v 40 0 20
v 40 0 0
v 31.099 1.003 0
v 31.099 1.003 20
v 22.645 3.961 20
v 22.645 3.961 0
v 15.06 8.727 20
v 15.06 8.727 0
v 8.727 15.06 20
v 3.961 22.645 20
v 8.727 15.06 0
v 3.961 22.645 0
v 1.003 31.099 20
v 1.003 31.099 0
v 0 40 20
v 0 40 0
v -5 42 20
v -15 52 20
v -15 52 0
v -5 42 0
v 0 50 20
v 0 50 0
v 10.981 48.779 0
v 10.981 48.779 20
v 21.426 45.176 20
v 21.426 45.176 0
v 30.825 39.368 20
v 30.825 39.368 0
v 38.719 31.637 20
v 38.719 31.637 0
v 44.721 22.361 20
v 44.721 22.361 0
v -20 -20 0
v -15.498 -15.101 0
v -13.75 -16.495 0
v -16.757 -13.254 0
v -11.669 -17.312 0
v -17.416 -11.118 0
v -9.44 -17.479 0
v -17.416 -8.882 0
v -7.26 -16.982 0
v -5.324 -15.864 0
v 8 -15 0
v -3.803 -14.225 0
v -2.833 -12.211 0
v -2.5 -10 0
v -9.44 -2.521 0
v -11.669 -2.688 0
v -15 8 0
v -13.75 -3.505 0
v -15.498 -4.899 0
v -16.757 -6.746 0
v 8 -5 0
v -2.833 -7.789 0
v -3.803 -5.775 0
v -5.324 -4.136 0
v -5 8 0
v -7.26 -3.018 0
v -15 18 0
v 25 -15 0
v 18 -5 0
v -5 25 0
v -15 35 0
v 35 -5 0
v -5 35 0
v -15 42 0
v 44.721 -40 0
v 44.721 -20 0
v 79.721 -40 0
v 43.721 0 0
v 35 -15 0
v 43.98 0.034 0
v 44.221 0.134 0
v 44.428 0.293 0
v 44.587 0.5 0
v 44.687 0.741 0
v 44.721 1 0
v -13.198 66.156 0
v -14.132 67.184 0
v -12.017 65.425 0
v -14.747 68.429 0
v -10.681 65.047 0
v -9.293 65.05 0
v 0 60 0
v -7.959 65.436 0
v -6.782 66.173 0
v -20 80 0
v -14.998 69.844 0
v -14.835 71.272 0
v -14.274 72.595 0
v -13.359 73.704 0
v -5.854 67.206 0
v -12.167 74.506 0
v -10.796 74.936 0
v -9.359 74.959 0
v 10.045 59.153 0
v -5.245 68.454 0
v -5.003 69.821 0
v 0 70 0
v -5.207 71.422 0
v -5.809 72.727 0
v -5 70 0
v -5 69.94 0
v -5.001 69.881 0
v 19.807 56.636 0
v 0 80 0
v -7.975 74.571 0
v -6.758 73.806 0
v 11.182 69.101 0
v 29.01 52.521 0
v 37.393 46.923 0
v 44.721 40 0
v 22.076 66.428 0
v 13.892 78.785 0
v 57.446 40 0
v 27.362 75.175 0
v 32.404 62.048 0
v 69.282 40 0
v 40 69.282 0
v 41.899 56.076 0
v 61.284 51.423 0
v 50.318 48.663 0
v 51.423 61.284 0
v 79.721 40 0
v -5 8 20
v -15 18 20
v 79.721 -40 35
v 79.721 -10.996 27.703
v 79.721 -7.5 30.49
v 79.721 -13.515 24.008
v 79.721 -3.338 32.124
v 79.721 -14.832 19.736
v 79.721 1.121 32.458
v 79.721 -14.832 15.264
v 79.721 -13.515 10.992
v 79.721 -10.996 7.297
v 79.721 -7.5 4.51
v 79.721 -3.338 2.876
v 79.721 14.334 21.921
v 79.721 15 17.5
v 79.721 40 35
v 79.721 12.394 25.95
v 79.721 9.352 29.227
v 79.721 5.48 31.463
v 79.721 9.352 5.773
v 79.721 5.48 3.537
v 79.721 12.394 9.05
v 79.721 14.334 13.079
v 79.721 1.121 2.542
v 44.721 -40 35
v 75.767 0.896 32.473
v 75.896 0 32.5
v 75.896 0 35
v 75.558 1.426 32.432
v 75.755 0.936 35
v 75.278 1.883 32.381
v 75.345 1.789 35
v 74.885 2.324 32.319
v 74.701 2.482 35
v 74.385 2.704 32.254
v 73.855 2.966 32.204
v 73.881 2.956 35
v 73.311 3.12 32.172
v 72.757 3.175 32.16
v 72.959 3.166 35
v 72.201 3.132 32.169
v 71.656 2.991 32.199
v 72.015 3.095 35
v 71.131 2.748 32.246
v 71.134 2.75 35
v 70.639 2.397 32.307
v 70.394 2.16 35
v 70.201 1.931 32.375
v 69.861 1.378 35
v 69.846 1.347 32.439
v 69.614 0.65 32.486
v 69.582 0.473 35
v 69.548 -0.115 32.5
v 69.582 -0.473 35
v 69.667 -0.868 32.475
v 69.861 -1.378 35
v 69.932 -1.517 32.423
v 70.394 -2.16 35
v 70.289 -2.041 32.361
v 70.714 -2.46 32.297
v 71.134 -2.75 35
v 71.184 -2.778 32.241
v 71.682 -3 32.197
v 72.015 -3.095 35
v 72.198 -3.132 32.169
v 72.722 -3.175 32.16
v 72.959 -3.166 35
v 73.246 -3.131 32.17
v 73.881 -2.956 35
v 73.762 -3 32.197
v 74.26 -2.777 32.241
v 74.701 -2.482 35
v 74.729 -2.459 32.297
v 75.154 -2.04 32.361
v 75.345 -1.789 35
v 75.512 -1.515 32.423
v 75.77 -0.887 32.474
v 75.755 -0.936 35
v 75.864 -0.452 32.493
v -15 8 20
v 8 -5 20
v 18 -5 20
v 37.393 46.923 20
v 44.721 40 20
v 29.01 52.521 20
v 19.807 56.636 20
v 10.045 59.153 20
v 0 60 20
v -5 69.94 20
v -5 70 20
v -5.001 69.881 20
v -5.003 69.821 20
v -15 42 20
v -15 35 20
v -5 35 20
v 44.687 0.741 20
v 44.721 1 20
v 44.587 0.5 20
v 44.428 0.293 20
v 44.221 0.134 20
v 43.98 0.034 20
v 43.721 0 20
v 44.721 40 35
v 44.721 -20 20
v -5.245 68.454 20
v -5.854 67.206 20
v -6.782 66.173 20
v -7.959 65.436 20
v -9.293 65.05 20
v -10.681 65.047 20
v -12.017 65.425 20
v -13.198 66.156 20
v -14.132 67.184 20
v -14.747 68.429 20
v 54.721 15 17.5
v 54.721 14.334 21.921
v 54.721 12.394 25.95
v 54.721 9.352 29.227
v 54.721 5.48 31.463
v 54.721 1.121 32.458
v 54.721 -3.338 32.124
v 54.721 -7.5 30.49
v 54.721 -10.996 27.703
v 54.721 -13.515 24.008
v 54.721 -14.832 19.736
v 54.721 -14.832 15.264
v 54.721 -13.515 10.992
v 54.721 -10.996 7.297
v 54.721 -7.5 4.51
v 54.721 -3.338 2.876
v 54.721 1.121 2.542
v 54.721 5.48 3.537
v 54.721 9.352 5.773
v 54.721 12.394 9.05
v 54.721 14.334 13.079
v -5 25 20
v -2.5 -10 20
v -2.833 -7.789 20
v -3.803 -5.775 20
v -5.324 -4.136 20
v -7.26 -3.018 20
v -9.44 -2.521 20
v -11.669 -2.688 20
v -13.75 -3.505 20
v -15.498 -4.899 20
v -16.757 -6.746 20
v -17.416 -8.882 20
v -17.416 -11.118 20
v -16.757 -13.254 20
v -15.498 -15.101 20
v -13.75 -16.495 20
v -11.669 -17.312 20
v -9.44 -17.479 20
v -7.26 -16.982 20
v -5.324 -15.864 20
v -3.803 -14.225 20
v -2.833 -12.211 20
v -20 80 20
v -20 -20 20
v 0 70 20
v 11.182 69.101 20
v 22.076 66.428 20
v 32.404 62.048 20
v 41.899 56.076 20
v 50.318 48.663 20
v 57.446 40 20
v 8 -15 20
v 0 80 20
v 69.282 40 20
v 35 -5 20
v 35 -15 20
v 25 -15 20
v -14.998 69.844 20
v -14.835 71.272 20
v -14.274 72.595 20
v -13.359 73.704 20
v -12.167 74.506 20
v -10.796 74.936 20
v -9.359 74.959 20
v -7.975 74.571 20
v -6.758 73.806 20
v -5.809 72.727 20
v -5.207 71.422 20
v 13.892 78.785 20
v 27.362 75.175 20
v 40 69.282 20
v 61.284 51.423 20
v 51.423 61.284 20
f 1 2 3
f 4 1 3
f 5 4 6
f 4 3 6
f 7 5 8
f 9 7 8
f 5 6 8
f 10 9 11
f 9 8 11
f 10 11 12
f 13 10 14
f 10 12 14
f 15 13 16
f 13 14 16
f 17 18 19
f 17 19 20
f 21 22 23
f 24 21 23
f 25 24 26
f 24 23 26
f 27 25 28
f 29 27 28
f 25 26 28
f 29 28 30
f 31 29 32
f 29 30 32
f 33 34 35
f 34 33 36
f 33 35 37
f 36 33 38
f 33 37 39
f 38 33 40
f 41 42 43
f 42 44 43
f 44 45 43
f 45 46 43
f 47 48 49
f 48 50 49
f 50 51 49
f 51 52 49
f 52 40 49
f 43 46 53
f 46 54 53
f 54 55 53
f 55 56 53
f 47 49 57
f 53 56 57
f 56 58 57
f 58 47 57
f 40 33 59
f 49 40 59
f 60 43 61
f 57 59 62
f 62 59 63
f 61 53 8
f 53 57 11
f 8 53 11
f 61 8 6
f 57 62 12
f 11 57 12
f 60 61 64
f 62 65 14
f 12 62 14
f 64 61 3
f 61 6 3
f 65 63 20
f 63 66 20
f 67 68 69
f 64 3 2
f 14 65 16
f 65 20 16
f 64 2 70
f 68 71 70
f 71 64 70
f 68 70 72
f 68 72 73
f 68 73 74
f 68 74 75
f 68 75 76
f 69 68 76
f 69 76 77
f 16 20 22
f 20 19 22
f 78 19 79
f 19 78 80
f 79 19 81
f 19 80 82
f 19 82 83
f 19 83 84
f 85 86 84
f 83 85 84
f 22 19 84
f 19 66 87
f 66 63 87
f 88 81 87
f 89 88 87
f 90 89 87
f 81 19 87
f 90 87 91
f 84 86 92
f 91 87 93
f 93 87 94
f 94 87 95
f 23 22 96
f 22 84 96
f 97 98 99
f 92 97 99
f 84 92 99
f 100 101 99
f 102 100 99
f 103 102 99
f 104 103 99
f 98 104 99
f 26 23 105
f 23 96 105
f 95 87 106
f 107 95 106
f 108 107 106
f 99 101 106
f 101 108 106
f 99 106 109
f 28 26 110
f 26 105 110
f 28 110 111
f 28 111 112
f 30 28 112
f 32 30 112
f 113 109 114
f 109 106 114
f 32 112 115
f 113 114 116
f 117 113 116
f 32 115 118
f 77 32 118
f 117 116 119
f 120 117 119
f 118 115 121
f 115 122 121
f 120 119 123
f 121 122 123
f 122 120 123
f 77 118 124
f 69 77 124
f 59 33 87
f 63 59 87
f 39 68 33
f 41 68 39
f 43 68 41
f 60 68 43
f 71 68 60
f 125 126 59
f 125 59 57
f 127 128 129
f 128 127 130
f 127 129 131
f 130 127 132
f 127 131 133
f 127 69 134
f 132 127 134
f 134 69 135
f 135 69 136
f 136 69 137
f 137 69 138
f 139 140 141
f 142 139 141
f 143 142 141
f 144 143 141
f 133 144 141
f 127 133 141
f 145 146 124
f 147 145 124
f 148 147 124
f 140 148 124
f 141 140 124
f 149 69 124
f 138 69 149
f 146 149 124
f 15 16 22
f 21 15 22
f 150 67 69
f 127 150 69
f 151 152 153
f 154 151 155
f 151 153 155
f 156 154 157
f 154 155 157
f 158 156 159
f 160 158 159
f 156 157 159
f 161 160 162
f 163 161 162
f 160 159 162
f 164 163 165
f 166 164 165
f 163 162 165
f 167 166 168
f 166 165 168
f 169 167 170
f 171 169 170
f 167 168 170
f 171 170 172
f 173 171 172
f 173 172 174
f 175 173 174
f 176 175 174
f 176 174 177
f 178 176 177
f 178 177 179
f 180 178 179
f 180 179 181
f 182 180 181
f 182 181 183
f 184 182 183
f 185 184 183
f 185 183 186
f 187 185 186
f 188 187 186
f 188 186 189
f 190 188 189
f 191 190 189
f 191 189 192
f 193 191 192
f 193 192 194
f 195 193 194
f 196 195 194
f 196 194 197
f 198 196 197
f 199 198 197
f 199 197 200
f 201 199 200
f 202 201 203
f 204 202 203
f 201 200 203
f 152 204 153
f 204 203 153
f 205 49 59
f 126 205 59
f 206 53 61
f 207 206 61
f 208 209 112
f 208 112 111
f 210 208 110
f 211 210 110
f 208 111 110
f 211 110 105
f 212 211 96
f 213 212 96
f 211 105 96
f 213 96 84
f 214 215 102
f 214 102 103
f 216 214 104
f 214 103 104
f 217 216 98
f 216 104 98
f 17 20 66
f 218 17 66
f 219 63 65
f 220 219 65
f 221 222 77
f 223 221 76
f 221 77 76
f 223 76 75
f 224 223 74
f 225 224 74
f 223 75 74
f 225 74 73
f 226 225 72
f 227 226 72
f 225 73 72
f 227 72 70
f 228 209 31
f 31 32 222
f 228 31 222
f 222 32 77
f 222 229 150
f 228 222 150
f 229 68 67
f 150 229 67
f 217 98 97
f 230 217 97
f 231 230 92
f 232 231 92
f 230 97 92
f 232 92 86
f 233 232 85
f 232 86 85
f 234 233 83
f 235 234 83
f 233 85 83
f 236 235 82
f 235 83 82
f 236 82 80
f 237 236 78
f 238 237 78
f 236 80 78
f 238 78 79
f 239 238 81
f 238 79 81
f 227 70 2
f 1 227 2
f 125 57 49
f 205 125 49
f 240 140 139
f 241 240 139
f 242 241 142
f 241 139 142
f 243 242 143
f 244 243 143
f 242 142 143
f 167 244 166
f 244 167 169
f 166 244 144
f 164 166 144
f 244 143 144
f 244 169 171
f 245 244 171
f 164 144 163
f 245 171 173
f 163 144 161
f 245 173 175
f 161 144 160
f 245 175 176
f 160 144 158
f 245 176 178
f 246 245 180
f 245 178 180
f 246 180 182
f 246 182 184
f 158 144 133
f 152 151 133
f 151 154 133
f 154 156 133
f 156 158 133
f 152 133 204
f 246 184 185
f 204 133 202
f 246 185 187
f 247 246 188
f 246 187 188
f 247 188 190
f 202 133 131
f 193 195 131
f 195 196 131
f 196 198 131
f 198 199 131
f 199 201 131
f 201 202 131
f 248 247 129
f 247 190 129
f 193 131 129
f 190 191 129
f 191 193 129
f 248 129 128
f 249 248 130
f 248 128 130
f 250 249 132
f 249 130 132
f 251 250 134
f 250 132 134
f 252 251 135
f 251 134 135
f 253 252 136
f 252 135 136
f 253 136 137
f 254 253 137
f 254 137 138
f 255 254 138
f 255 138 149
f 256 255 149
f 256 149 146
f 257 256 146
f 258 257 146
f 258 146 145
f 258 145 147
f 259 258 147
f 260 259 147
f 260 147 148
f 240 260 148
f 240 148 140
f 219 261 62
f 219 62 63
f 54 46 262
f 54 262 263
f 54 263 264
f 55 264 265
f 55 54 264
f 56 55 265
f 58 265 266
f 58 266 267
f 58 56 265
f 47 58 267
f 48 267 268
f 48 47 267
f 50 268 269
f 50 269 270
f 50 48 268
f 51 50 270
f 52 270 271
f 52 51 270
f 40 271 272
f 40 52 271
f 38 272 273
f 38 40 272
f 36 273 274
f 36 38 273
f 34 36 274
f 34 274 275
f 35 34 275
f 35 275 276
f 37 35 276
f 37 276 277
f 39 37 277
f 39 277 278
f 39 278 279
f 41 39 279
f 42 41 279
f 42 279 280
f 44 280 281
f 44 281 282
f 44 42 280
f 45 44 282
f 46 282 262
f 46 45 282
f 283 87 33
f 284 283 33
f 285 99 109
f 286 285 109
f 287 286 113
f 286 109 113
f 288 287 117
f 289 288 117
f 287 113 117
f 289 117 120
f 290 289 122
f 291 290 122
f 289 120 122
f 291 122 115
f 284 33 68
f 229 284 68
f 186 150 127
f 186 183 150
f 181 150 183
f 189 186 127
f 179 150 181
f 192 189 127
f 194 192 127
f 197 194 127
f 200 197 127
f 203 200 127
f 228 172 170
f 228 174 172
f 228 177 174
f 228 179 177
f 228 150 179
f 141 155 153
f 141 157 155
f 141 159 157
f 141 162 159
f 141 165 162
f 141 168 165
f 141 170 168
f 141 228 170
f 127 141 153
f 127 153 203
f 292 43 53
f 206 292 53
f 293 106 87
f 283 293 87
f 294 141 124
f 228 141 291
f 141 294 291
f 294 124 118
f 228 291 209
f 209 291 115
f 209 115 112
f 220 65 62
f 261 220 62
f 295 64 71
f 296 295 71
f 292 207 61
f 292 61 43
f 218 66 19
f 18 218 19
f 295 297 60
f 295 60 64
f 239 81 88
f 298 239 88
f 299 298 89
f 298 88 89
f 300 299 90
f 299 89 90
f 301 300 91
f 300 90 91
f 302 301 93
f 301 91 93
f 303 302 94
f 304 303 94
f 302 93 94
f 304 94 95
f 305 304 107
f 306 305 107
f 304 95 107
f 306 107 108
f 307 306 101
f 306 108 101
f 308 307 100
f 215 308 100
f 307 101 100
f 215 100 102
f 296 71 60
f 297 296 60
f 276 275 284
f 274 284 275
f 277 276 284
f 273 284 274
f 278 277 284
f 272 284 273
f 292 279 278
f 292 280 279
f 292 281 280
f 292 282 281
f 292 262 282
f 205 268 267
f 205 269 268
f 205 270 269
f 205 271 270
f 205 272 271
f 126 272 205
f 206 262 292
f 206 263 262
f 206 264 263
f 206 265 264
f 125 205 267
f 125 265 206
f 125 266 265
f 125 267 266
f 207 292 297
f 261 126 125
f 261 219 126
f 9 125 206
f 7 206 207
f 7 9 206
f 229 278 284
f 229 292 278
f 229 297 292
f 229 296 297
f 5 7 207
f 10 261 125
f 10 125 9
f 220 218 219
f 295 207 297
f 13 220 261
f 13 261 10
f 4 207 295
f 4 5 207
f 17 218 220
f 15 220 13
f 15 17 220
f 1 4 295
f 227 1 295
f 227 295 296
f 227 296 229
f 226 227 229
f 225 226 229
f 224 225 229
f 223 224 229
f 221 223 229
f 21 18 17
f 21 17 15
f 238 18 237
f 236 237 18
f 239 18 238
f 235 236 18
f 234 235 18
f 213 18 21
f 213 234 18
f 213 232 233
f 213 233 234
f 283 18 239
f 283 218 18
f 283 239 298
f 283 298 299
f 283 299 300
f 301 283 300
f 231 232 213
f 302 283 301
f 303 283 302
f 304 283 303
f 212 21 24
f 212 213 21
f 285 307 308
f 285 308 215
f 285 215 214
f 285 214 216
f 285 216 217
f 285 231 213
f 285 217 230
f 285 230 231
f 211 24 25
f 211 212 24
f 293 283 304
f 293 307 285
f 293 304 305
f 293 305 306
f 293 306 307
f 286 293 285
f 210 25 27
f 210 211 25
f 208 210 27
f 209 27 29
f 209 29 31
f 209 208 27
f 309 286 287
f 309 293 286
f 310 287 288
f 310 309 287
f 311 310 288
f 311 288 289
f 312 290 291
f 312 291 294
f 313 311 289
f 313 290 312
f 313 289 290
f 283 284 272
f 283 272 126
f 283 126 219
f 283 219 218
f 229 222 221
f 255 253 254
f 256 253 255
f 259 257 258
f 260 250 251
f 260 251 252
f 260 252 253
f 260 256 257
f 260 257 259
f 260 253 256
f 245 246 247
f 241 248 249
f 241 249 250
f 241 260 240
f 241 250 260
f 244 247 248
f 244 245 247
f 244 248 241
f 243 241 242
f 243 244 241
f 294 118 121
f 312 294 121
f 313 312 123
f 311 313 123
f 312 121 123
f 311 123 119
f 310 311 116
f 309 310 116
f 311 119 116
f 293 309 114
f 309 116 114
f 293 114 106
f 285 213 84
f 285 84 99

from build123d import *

# Parameters (mm, degrees)
F0_R     = 7.5
F1_DEPTH = 20
F2_DEPTH = 35
F3_R     = 15
F4_DEPTH = 25
F5_R     = 3.175
F6_DEPTH = 31.5


with BuildPart() as f1:
    # F0 (on Top) → F1 (new body)
    with BuildSketch(Plane.XY):
        with BuildLine():
            Line((0, 40), (0, 50))
            ThreePointArc((0, 50), (-5.8547207654, 49.6560393584), (-11.6288897904, 48.6288897904))
            Line((-11.6288897904, 48.6288897904), (-5, 42))
            Line((-5, 42), (-15, 42))
            Line((-15, 42), (-15, 47.6969600708))
            ThreePointArc((-15, 47.6969600708), (-17.5249921621, 46.8281395073), (-20, 45.8257569496))
            Line((-20, 45.8257569496), (-20, -20))
            Line((-20, -20), (0, -20))
            Line((0, -20), (43.72135955, -20))
            Line((43.72135955, -20), (44.72135955, -20))
            Line((44.72135955, -20), (44.72135955, 1))
            ThreePointArc((44.72135955, 1), (44.4284663312, 0.2928932188), (43.72135955, 0))
            Line((43.72135955, 0), (40, 0))
            ThreePointArc((40, 0), (11.7157287525, 11.7157287525), (0, 40))
        make_face()
        with Locations((-10, -10)):
            Circle(F0_R, mode=Mode.SUBTRACT)
        Polygon((8, -5), (18, -5), (8, -15), align=None, mode=Mode.SUBTRACT)
        Polygon((35, -15), (25, -15), (35, -5), align=None, mode=Mode.SUBTRACT)
        Polygon((-15, 8), (-15, 18), (-5, 8), align=None, mode=Mode.SUBTRACT)
        Polygon((-5, 35), (-5, 25), (-15, 35), align=None, mode=Mode.SUBTRACT)
        with BuildLine():
            Line((0, 50), (0, 60))
            ThreePointArc((0, 60), (-10.1461187235, 59.1359135792), (-20, 56.5685424949))
            Line((-20, 56.5685424949), (-20, 45.8257569496))
            ThreePointArc((-20, 45.8257569496), (-17.5249921621, 46.8281395073), (-15, 47.6969600708))
            Line((-15, 47.6969600708), (-15, 52))
            Line((-15, 52), (-11.6288897904, 48.6288897904))
            ThreePointArc((-11.6288897904, 48.6288897904), (-5.8547207654, 49.6560393584), (0, 50))
        make_face()
        with BuildLine():
            Line((0, 60), (0, 70))
            ThreePointArc((0, 70), (-2.5032041292, 69.9552283185), (-5.0032061825, 69.8209705454))
            ThreePointArc((-5.0032061825, 69.8209705454), (-9.2928932188, 65.0502525317), (-14.7467938175, 68.4290294546))
            ThreePointArc((-14.7467938175, 68.4290294546), (-17.3864463232, 67.8064265704), (-20, 67.082039325))
            Line((-20, 67.082039325), (-20, 56.5685424949))
            ThreePointArc((-20, 56.5685424949), (-10.1461187235, 59.1359135792), (0, 60))
        make_face()
        with BuildLine():
            Line((0, 70), (0, 80))
            ThreePointArc((0, 80), (-10.0803433986, 79.3623757014), (-20, 77.4596669241))
            Line((-20, 77.4596669241), (-20, 67.082039325))
            ThreePointArc((-20, 67.082039325), (-17.3864463232, 67.8064265704), (-14.7467938175, 68.4290294546))
            ThreePointArc((-14.7467938175, 68.4290294546), (-10.7956226846, 74.936292591), (-5, 70))
            ThreePointArc((-5, 70), (-5.0008016099, 69.9104709192), (-5.0032061825, 69.8209705454))
            ThreePointArc((-5.0032061825, 69.8209705454), (-2.5032041292, 69.9552283185), (0, 70))
        make_face()
        with BuildLine():
            ThreePointArc((-20, 77.4596669241), (-10.0803433986, 79.3623757014), (0, 80))
            Line((0, 80), (-20, 80))
            Line((-20, 80), (-20, 77.4596669241))
        make_face()
        with BuildLine():
            ThreePointArc((50, 0), (48.6624494734, 11.4876460274), (44.72135955, 22.360679775))
            Line((44.72135955, 22.360679775), (44.72135955, 1))
            Line((44.72135955, 1), (44.72135955, -20))
            Line((44.72135955, -20), (44.72135955, -21))
            Line((44.72135955, -21), (44.72135955, -22.360679775))
            ThreePointArc((44.72135955, -22.360679775), (48.6624494734, -11.4876460274), (50, 0))
        make_face()
        with BuildLine():
            ThreePointArc((60, 0), (56.0503415378, 21.4093253864), (44.72135955, 40))
            Line((44.72135955, 40), (44.72135955, 22.360679775))
            ThreePointArc((44.72135955, 22.360679775), (48.6624494734, 11.4876460274), (50, 0))
            ThreePointArc((50, 0), (48.6624494734, -11.4876460274), (44.72135955, -22.360679775))
            Line((44.72135955, -22.360679775), (44.72135955, -40))
            ThreePointArc((44.72135955, -40), (56.0503415378, -21.4093253864), (60, 0))
        make_face()
        with BuildLine():
            ThreePointArc((70, 0), (66.7877004117, 20.9619434622), (57.4456264654, 40))
            Line((57.4456264654, 40), (44.72135955, 40))
            ThreePointArc((44.72135955, 40), (56.0503415378, 21.4093253864), (60, 0))
            ThreePointArc((60, 0), (56.0503415378, -21.4093253864), (44.72135955, -40))
            Line((44.72135955, -40), (57.4456264654, -40))
            ThreePointArc((57.4456264654, -40), (66.7877004117, -20.9619434622), (70, 0))
        make_face()
        with BuildLine():
            ThreePointArc((79.72135955, 6.6711941585), (76.3426815131, 23.9122349309), (69.2820323028, 40))
            Line((69.2820323028, 40), (57.4456264654, 40))
            ThreePointArc((57.4456264654, 40), (66.7877004117, 20.9619434622), (70, 0))
            ThreePointArc((70, 0), (66.7877004117, -20.9619434622), (57.4456264654, -40))
            Line((57.4456264654, -40), (69.2820323028, -40))
            ThreePointArc((69.2820323028, -40), (76.3426815131, -23.9122349309), (79.72135955, -6.6711941585))
            Line((79.72135955, -6.6711941585), (79.72135955, 6.6711941585))
        make_face()
        with BuildLine():
            ThreePointArc((69.2820323028, 40), (40, 69.2820323028), (0, 80))
            Line((0, 80), (0, 70))
            ThreePointArc((0, 70), (32.403703492, 62.04836823), (57.4456264654, 40))
            Line((57.4456264654, 40), (69.2820323028, 40))
        make_face()
        with BuildLine():
            ThreePointArc((44.72135955, 40), (24.4948974278, 54.7722557505), (0, 60))
            Line((0, 60), (0, 50))
            ThreePointArc((0, 50), (26.286555606, 42.5325404176), (44.72135955, 22.360679775))
            Line((44.72135955, 22.360679775), (44.72135955, 40))
        make_face()
        with BuildLine():
            Line((79.72135955, 40), (69.2820323028, 40))
            ThreePointArc((69.2820323028, 40), (76.3426815131, 23.9122349309), (79.72135955, 6.6711941585))
            Line((79.72135955, 6.6711941585), (79.72135955, 40))
        make_face()
        with BuildLine():
            ThreePointArc((79.72135955, -6.6711941585), (76.3426815131, -23.9122349309), (69.2820323028, -40))
            Line((69.2820323028, -40), (79.72135955, -40))
            Line((79.72135955, -40), (79.72135955, -6.6711941585))
        make_face()
    extrude(amount=F1_DEPTH)

    # F0 (on Top) → F2 (join)
    with BuildSketch(Plane.XY):
        with BuildLine():
            ThreePointArc((50, 0), (48.6624494734, 11.4876460274), (44.72135955, 22.360679775))
            Line((44.72135955, 22.360679775), (44.72135955, 1))
            Line((44.72135955, 1), (44.72135955, -20))
            Line((44.72135955, -20), (44.72135955, -21))
            Line((44.72135955, -21), (44.72135955, -22.360679775))
            ThreePointArc((44.72135955, -22.360679775), (48.6624494734, -11.4876460274), (50, 0))
        make_face()
        with BuildLine():
            ThreePointArc((60, 0), (56.0503415378, 21.4093253864), (44.72135955, 40))
            Line((44.72135955, 40), (44.72135955, 22.360679775))
            ThreePointArc((44.72135955, 22.360679775), (48.6624494734, 11.4876460274), (50, 0))
            ThreePointArc((50, 0), (48.6624494734, -11.4876460274), (44.72135955, -22.360679775))
            Line((44.72135955, -22.360679775), (44.72135955, -40))
            ThreePointArc((44.72135955, -40), (56.0503415378, -21.4093253864), (60, 0))
        make_face()
        with BuildLine():
            ThreePointArc((70, 0), (66.7877004117, 20.9619434622), (57.4456264654, 40))
            Line((57.4456264654, 40), (44.72135955, 40))
            ThreePointArc((44.72135955, 40), (56.0503415378, 21.4093253864), (60, 0))
            ThreePointArc((60, 0), (56.0503415378, -21.4093253864), (44.72135955, -40))
            Line((44.72135955, -40), (57.4456264654, -40))
            ThreePointArc((57.4456264654, -40), (66.7877004117, -20.9619434622), (70, 0))
        make_face()
        with BuildLine():
            ThreePointArc((79.72135955, 6.6711941585), (76.3426815131, 23.9122349309), (69.2820323028, 40))
            Line((69.2820323028, 40), (57.4456264654, 40))
            ThreePointArc((57.4456264654, 40), (66.7877004117, 20.9619434622), (70, 0))
            ThreePointArc((70, 0), (66.7877004117, -20.9619434622), (57.4456264654, -40))
            Line((57.4456264654, -40), (69.2820323028, -40))
            ThreePointArc((69.2820323028, -40), (76.3426815131, -23.9122349309), (79.72135955, -6.6711941585))
            Line((79.72135955, -6.6711941585), (79.72135955, 6.6711941585))
        make_face()
        with BuildLine():
            ThreePointArc((79.72135955, -6.6711941585), (76.3426815131, -23.9122349309), (69.2820323028, -40))
            Line((69.2820323028, -40), (79.72135955, -40))
            Line((79.72135955, -40), (79.72135955, -6.6711941585))
        make_face()
        with BuildLine():
            Line((79.72135955, 40), (69.2820323028, 40))
            ThreePointArc((69.2820323028, 40), (76.3426815131, 23.9122349309), (79.72135955, 6.6711941585))
            Line((79.72135955, 6.6711941585), (79.72135955, 40))
        make_face()
    extrude(amount=F2_DEPTH)

    # F3 (on face) → F4 (cut)
    with BuildSketch(Plane.YZ.offset(79.72135955)):
        with Locations((0, 17.5)):
            Circle(F3_R)
    extrude(amount=-F4_DEPTH, mode=Mode.SUBTRACT)

    # F5 (on face) → F6 (cut)
    with BuildSketch(Plane.XY.offset(35)):
        with Locations((72.72135955, 0)):
            Circle(F5_R)
    extrude(amount=-F6_DEPTH, mode=Mode.SUBTRACT)


solid = f1.part
